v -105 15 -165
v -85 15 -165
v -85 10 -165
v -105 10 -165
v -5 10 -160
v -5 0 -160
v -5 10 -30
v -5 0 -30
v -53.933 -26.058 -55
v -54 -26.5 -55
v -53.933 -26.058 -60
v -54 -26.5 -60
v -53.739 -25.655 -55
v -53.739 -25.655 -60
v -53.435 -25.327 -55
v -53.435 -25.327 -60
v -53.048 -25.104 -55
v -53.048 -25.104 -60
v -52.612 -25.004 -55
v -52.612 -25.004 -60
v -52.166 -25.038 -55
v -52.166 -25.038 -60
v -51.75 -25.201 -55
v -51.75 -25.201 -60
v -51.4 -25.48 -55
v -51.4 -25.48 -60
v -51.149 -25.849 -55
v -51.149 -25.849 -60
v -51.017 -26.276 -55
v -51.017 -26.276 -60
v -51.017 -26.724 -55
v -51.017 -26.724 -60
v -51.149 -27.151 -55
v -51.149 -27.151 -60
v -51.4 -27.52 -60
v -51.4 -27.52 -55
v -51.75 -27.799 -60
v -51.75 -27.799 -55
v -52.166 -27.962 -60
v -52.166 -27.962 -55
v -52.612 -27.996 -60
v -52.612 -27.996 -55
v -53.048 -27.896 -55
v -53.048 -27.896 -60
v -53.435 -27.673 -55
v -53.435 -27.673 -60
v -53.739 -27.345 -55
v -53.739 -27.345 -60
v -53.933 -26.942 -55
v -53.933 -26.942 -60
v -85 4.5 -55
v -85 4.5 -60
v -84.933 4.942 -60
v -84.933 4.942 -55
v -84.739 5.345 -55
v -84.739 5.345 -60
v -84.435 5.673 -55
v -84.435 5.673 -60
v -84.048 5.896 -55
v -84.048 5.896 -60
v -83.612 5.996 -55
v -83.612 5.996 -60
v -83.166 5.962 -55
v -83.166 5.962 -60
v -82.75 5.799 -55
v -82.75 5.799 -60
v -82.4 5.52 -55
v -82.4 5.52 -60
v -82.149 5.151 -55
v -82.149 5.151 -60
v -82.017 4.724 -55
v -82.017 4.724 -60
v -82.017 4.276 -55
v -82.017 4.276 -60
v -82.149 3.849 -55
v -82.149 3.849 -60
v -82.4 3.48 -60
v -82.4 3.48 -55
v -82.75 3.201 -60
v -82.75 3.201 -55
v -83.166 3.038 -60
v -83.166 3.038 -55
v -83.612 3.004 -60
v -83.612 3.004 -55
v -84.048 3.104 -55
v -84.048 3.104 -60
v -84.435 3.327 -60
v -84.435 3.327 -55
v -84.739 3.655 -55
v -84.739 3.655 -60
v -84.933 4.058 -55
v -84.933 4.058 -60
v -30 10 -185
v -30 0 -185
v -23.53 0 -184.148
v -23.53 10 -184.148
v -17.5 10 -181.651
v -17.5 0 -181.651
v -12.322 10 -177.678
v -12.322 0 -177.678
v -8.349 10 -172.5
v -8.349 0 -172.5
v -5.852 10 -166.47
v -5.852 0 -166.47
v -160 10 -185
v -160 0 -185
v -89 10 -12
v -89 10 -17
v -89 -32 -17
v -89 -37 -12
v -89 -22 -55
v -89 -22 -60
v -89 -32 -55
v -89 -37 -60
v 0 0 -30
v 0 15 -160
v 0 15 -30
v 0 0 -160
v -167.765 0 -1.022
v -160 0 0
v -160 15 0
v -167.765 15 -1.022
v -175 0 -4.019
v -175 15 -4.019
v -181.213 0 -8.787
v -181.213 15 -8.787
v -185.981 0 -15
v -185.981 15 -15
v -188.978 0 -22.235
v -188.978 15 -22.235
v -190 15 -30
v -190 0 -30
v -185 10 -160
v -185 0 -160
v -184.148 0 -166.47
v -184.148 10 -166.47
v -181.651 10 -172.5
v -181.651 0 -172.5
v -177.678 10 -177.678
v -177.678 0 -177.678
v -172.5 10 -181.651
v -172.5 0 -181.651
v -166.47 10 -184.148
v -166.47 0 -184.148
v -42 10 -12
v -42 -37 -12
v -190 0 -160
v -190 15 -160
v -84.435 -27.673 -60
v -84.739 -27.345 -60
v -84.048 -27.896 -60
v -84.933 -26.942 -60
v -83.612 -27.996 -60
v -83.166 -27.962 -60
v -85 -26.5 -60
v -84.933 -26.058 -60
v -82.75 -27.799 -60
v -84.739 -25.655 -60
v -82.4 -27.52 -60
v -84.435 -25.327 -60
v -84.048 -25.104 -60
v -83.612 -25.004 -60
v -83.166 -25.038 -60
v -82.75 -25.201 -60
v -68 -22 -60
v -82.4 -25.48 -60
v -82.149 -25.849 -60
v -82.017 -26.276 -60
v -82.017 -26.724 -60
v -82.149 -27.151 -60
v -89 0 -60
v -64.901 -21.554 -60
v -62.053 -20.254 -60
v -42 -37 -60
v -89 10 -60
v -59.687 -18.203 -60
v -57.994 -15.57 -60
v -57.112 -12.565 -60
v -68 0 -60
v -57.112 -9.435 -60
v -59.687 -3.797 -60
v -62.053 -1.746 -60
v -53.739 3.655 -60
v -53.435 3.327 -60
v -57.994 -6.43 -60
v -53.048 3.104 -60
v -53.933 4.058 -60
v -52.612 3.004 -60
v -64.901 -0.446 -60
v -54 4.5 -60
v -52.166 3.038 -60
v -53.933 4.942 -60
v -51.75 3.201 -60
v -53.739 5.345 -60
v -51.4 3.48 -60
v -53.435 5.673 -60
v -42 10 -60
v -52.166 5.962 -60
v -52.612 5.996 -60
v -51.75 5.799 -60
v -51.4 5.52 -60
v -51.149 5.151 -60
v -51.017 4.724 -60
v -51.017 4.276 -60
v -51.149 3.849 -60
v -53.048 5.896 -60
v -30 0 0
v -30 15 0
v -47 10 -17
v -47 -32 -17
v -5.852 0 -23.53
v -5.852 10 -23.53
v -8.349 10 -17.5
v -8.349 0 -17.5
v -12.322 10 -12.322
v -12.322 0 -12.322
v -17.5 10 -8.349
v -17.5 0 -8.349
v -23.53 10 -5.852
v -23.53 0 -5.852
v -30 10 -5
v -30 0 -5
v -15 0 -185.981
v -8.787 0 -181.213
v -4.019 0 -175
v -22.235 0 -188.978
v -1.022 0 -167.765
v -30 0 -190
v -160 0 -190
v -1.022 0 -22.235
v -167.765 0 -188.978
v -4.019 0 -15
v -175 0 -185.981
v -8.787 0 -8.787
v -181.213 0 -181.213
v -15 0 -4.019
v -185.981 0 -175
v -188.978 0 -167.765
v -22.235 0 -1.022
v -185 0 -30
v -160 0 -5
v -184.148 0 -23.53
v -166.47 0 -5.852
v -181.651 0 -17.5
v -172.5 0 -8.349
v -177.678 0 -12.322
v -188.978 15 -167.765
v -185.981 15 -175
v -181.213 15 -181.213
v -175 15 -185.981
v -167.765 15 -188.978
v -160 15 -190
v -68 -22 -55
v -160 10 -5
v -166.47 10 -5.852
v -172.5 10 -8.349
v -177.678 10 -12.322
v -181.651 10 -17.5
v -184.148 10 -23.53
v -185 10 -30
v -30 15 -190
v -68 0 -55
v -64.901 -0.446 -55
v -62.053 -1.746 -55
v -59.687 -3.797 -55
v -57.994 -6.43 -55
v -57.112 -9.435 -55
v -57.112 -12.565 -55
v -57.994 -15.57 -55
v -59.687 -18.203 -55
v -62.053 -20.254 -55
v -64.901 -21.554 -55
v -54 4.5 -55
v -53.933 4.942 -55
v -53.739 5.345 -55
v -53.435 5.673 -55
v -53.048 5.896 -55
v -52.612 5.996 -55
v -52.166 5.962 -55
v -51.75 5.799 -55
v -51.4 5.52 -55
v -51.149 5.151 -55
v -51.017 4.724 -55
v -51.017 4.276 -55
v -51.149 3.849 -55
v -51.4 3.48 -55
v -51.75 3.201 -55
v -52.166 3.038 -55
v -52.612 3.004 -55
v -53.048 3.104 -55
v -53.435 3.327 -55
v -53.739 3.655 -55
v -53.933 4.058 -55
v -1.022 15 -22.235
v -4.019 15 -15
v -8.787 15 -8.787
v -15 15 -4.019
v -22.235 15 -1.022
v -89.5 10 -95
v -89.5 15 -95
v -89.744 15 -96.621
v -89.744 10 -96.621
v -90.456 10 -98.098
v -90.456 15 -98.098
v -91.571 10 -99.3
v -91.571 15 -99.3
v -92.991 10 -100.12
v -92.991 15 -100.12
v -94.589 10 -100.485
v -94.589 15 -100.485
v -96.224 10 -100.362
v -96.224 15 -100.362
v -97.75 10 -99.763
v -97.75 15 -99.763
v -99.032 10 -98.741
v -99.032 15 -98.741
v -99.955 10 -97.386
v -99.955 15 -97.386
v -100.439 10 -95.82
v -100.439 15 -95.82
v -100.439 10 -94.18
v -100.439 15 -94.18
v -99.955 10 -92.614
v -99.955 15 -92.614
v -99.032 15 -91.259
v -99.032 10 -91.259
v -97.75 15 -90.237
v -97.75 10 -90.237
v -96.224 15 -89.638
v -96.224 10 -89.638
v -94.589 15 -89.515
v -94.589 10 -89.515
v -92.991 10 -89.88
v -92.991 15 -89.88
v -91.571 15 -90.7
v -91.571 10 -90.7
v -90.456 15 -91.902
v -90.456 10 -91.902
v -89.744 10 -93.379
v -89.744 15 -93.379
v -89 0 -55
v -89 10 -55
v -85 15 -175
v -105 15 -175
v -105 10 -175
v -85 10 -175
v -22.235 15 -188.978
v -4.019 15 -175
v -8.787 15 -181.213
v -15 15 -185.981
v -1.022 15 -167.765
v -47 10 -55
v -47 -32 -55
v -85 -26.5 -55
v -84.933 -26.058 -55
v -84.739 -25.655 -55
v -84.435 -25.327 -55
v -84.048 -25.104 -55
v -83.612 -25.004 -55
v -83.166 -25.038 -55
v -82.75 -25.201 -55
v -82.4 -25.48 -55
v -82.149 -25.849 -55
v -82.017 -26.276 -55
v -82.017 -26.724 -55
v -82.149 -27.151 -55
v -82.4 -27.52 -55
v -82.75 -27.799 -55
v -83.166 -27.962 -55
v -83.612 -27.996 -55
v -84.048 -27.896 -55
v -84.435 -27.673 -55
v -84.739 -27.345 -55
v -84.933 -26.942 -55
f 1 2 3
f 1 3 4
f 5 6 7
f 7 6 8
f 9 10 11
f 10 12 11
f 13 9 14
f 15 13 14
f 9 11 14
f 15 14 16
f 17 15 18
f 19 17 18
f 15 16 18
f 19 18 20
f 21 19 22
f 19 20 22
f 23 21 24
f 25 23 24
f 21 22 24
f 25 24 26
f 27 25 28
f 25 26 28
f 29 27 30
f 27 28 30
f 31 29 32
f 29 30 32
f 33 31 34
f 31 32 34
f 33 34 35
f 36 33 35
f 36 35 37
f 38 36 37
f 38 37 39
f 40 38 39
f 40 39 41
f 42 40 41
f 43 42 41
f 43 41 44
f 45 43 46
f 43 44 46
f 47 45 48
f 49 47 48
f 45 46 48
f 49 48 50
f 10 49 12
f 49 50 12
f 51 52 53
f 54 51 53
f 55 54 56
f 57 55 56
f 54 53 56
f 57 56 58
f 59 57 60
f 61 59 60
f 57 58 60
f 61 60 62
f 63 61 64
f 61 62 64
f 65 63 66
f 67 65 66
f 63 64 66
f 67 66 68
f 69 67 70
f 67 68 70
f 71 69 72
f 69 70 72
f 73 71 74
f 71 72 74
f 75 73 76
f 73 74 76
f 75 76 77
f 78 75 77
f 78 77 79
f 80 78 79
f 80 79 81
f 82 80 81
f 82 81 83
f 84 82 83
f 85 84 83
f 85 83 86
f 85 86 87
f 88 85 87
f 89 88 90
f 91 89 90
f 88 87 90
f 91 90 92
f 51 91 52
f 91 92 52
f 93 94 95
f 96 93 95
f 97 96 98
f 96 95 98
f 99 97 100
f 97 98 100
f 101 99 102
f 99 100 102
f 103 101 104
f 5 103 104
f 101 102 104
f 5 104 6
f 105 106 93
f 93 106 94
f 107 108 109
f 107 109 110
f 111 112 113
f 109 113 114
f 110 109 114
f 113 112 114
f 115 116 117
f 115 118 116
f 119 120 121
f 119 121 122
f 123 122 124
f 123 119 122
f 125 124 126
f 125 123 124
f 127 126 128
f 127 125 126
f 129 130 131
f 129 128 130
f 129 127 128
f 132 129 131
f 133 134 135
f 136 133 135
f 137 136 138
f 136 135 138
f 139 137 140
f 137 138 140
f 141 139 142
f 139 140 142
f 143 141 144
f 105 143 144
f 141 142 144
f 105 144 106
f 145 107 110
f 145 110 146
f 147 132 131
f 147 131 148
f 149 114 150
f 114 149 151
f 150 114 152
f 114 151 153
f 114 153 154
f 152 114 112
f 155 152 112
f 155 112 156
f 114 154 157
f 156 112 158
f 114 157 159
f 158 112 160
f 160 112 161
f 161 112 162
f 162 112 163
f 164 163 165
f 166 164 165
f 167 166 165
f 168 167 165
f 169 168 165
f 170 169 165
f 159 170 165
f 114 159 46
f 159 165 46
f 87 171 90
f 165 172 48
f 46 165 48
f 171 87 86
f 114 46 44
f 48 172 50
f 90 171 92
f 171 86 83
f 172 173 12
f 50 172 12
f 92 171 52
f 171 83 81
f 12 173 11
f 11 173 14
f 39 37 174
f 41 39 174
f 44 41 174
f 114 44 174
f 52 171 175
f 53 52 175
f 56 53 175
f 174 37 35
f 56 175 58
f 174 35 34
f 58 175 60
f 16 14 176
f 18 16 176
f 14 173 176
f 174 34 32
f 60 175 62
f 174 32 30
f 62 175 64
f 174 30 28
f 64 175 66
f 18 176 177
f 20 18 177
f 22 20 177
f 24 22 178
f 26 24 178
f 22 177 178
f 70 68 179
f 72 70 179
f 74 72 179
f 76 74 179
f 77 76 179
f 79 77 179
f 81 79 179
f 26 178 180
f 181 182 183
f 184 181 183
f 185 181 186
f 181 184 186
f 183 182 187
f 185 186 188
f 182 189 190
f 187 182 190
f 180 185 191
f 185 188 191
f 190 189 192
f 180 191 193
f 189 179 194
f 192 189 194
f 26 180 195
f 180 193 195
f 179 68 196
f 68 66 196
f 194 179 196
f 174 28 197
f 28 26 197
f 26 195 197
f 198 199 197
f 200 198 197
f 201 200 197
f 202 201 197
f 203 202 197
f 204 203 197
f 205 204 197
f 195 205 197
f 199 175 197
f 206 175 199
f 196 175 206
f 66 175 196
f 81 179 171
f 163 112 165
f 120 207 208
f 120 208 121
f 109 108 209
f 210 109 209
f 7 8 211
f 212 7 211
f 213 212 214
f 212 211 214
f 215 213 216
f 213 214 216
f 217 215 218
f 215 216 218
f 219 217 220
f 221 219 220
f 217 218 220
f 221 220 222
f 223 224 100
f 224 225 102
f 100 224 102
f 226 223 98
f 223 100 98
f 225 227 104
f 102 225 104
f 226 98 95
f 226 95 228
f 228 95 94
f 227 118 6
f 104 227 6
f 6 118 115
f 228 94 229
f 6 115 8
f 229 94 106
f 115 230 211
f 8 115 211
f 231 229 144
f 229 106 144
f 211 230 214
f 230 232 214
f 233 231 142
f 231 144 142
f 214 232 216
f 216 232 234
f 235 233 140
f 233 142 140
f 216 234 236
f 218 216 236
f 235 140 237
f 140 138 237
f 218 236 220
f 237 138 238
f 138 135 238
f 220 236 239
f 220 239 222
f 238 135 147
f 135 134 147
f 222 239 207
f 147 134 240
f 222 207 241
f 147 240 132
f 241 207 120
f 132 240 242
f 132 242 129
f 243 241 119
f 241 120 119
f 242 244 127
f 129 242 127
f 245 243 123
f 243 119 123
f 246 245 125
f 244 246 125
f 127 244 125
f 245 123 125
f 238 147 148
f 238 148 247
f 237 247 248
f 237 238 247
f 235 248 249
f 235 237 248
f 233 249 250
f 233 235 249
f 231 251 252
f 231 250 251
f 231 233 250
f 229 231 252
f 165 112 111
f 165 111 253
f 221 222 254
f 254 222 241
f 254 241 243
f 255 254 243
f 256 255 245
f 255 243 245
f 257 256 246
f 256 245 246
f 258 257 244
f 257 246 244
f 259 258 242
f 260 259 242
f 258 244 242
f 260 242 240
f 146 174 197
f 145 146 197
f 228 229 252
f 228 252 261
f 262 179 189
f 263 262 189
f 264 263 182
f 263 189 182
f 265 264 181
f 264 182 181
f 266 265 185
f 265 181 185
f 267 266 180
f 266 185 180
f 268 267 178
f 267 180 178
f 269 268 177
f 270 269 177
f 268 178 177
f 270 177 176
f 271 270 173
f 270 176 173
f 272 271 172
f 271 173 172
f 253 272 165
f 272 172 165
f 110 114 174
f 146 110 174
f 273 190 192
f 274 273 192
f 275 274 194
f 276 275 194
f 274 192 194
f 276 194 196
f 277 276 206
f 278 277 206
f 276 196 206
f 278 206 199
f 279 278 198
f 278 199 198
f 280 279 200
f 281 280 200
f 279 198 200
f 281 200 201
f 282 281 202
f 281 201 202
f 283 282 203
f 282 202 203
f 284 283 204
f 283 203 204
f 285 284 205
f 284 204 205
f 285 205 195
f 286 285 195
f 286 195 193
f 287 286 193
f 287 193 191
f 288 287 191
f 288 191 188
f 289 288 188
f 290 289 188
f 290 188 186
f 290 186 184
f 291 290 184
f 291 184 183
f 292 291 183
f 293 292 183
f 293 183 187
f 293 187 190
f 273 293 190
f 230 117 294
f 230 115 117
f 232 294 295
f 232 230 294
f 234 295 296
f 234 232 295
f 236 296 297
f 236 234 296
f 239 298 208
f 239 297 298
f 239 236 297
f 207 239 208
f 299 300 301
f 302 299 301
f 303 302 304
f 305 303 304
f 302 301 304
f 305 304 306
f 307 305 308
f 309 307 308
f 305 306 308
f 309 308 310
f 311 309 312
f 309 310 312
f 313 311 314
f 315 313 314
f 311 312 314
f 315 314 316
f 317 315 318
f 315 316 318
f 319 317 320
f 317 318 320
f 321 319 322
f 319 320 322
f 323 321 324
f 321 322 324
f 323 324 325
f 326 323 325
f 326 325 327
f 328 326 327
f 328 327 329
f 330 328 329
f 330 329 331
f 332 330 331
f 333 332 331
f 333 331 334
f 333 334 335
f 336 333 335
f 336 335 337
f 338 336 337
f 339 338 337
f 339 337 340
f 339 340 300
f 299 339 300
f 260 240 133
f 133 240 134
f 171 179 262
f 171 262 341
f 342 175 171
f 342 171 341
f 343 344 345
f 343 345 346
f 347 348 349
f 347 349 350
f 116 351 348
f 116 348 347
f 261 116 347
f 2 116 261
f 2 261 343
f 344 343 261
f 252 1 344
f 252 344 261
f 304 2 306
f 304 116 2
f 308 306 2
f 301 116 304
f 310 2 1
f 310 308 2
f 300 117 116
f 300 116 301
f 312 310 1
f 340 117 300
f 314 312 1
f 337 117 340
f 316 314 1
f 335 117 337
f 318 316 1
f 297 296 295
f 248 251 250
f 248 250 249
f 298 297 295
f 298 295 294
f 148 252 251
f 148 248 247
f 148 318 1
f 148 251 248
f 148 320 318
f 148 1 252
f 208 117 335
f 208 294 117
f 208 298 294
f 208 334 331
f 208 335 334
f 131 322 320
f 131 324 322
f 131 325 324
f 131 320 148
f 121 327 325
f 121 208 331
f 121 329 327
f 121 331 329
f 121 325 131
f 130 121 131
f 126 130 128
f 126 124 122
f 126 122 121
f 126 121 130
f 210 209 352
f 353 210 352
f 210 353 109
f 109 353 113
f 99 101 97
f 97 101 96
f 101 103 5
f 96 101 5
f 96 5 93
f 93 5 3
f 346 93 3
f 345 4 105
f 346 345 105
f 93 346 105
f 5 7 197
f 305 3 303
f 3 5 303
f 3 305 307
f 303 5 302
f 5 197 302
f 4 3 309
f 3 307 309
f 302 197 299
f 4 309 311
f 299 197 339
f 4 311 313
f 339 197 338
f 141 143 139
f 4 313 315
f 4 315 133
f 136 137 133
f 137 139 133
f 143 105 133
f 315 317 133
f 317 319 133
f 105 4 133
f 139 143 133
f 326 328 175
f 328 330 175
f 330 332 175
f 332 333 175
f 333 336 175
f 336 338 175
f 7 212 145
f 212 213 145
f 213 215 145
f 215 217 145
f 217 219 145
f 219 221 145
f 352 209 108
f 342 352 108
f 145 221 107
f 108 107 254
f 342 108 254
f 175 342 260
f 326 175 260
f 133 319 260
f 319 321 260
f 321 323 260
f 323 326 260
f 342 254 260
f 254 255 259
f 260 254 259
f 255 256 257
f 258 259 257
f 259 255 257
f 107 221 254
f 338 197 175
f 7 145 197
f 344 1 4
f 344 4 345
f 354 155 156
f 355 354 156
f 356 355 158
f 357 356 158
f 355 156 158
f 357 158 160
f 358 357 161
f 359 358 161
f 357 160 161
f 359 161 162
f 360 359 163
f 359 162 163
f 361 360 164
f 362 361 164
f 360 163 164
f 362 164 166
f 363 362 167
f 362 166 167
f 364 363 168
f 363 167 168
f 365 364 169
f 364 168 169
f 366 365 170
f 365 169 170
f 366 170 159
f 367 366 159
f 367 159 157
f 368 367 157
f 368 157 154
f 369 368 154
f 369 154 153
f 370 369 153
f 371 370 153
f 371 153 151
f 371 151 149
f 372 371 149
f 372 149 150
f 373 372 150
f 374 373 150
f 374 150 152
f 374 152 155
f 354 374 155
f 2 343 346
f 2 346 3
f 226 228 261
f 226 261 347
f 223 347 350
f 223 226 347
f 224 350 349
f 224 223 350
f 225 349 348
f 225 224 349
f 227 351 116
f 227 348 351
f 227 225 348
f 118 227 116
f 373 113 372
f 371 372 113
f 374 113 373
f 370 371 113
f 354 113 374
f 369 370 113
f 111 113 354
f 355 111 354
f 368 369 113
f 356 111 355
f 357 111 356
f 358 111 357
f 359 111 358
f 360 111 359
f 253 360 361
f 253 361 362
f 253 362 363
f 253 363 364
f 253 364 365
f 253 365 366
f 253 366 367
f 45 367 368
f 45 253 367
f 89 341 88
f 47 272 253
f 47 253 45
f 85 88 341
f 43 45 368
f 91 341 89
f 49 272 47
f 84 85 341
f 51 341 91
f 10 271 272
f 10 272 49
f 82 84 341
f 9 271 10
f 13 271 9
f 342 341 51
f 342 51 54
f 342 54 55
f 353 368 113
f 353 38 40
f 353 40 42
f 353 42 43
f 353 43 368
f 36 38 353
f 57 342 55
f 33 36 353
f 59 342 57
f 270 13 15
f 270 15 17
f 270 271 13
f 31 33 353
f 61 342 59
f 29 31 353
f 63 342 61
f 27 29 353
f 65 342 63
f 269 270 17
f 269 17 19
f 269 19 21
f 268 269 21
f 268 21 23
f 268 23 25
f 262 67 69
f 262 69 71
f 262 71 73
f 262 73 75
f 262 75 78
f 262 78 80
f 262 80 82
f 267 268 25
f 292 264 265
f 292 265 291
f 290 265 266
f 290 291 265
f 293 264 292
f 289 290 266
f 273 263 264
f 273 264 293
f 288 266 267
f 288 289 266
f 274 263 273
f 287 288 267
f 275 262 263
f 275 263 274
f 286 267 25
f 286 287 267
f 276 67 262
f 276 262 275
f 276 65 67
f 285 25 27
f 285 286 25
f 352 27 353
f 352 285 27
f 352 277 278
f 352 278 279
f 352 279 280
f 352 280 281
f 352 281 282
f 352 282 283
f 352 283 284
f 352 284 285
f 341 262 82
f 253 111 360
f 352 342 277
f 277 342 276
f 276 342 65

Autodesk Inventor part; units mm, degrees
ref_plane "YZ Plane" through (0, 0, 0) normal (1, 0, 0) x (0, 1, 0)
ref_plane "XZ Plane" through (0, 0, 0) normal (0, 1, 0) x (-1, 0, 0)
ref_plane "XY Plane" through (0, 0, 0) normal (0, 0, 1) x (1, 0, 0)
sketch "스케치1" plane through (0, 0, 0) normal (0, 1, 0) x (-1, 0, 0)
  line L0 (30, 0) -> (160, 0)
  line L1 (190, -30) -> (190, -160)
  line L2 (160, -190) -> (30, -190)
  line L3 (0, -160) -> (0, -30)
  arc A0 (190, -30) -> (160, 0) centre (160, -30) ccw
  arc A1 (160, -190) -> (190, -160) centre (160, -160) ccw
  arc A2 (0, -160) -> (30, -190) centre (30, -160) ccw
  arc A3 (30, 0) -> (0, -30) centre (30, -30) ccw
  point P0 (0, 0)
  point P1 (190, -190)
  point P2 (190, 0)
  point P3 (0, -190)
  dimension "d0" = 190
  dimension "d1" = 190
  dimension "d2" = 30
extrude "돌출1" add sketch "스케치1" along normal blind 15
shell "쉘1" thickness 5 removed faces 1 at (-106.6667, 0, -116.6667)
sketch "스케치3" plane through (0, 15, 0) normal (0, 1, 0) x (1, 0, 0)
  circle A0 centre (-95, 95) radius 5.5
  line L0 (-190, 160) -> (-190, 30) projected
  line L1 (-160, 0) -> (-30, 0) projected
  line L2 (-105, 175) -> (-85, 175)
  line L3 (-85, 175) -> (-85, 165)
  line L4 (-85, 165) -> (-105, 165)
  line L5 (-105, 165) -> (-105, 175)
  line L6 (-30, 190) -> (-160, 190) projected
  point P0 (0, 0)
  point P1 (-105, 170)
  dimension "d12" = 11
  dimension "d13" = 95
  dimension "d14" = 95
  dimension "d15" = 20
  dimension "d16" = 10
  dimension "d17" = 85
  dimension "d18" = 15
extrude "돌출3" cut sketch "스케치3" against normal blind 10
sketch "스케치4" plane through (-160, 10, -185) normal (0, -1, 0) x (1, 0, 0)
  circle A0 centre (65, 90) radius 22
  circle A1 centre (65, 90) radius 5.5 projected
  line L0 (71, 130) -> (113, 130)
  line L1 (113, 130) -> (113, 125)
  line L2 (113, 125) -> (71, 125)
  line L3 (71, 125) -> (71, 130)
  line L4 (130, 0) -> (0, 0) projected
  line L5 (155, 155) -> (155, 25) projected
  line L6 (0, 180) -> (130, 180) projected
  line L7 (113, 125) -> (118, 125)
  line L8 (118, 125) -> (118, 163)
  line L9 (118, 163) -> (113, 163)
  line L10 (113, 163) -> (113, 125)
  point P0 (160, 185)
  point P1 (113, 127.5)
  point P2 (113, 130)
  dimension "d21" = 44
  dimension "d22" = 42
  dimension "d23" = 5
  dimension "d25" = 42
  dimension "d28" = 50
  dimension "d47" = 5
  dimension "d48" = 38
extrude "돌출4" add sketch "스케치4" along normal blind 42 contours L0 L1 L2 L3 | L10 L9 L8 L7 L1
sketch "스케치5" plane through (-47, 10, -60) normal (0, 0, -1) x (-1, 0, 0)
  circle A0 centre (5.5, -36.5) radius 1.5
  circle A1 centre (36.5, -36.5) radius 1.5
  circle A2 centre (36.5, -5.5) radius 1.5
  circle A3 centre (5.5, -5.5) radius 1.5
  line L0 (42, 0) -> (42, -42) projected
  line L1 (0, 0) -> (0, -42) projected
  line L2 (42, -42) -> (0, -42) projected
  circle A4 centre (21, -21) radius 11
  line L3 (21, -10) -> (42, -10)
  line L4 (42, -10) -> (42, -32)
  line L5 (42, -32) -> (21, -32)
  line L6 (21, -32) -> (21, -10)
  point P0 (-47, -10)
  point P1 (21, -32)
  dimension "d44" = 22
  dimension "d29" = 3
  dimension "d30" = 3
  dimension "d31" = 3
  dimension "d32" = 3
  dimension "d33" = 31
  dimension "d34" = 31
  dimension "d35" = 31
  dimension "d36" = 31
  dimension "d37" = 31
  dimension "d38" = 31
  dimension "d39" = 42
  dimension "d40" = 5.5
  dimension "d41" = 5.5
  dimension "d45" = 21
  dimension "d46" = 21
extrude "돌출5" cut sketch "스케치5" against normal blind 42
sketch "스케치6" plane through (-160, -32, -185) normal (0, -1, 0) x (1, 0, 0)
  line L0 (118, 163) -> (118, 125) projected
  line L1 (92, 125) -> (71, 125) projected
  line L2 (118, 163) -> (71, 163)
  line L3 (71, 163) -> (71, 125)
  line L4 (71, 125) -> (118, 125)
  line L5 (118, 125) -> (118, 163)
  point P0 (160, 185)
  point P1 (92, 125)
  point P2 (118, 125)
extrude "돌출6" add sketch "스케치6" along normal blind 5
sketch "스케치7" plane through (-47, 10, -22) normal (0, 0, 1) x (1, 0, 0)
  line L0 (0, 0) -> (5, 0) projected
  line L1 (0, 0) -> (0, -42) projected
  line L2 (0, -42) -> (-42, -42) projected
  line L3 (-42, -42) -> (-42, -47) projected
  line L4 (5, -47) -> (-42, -47) projected
  line L5 (5, 0) -> (5, -47) projected
  point P0 (47, -10)
extrude "돌출7" add sketch "스케치7" along normal blind 5
sketch "스케치8" plane through (-47, 10, -17) normal (0, 0, 1) x (1, 0, 0)
  line L0 (-42, -47) -> (5, -47) projected
  line L1 (5, -47) -> (5, 0) projected
  line L2 (-42, -47) -> (5, -47)
  line L3 (5, -47) -> (5, 0)
  line L4 (5, 0) -> (-42, 0)
  line L5 (-42, 0) -> (-42, -47)
  point P0 (47, -10)
extrude "돌출8" add sketch "스케치8" along normal blind 5
properties part number "top_3D 인쇄"
